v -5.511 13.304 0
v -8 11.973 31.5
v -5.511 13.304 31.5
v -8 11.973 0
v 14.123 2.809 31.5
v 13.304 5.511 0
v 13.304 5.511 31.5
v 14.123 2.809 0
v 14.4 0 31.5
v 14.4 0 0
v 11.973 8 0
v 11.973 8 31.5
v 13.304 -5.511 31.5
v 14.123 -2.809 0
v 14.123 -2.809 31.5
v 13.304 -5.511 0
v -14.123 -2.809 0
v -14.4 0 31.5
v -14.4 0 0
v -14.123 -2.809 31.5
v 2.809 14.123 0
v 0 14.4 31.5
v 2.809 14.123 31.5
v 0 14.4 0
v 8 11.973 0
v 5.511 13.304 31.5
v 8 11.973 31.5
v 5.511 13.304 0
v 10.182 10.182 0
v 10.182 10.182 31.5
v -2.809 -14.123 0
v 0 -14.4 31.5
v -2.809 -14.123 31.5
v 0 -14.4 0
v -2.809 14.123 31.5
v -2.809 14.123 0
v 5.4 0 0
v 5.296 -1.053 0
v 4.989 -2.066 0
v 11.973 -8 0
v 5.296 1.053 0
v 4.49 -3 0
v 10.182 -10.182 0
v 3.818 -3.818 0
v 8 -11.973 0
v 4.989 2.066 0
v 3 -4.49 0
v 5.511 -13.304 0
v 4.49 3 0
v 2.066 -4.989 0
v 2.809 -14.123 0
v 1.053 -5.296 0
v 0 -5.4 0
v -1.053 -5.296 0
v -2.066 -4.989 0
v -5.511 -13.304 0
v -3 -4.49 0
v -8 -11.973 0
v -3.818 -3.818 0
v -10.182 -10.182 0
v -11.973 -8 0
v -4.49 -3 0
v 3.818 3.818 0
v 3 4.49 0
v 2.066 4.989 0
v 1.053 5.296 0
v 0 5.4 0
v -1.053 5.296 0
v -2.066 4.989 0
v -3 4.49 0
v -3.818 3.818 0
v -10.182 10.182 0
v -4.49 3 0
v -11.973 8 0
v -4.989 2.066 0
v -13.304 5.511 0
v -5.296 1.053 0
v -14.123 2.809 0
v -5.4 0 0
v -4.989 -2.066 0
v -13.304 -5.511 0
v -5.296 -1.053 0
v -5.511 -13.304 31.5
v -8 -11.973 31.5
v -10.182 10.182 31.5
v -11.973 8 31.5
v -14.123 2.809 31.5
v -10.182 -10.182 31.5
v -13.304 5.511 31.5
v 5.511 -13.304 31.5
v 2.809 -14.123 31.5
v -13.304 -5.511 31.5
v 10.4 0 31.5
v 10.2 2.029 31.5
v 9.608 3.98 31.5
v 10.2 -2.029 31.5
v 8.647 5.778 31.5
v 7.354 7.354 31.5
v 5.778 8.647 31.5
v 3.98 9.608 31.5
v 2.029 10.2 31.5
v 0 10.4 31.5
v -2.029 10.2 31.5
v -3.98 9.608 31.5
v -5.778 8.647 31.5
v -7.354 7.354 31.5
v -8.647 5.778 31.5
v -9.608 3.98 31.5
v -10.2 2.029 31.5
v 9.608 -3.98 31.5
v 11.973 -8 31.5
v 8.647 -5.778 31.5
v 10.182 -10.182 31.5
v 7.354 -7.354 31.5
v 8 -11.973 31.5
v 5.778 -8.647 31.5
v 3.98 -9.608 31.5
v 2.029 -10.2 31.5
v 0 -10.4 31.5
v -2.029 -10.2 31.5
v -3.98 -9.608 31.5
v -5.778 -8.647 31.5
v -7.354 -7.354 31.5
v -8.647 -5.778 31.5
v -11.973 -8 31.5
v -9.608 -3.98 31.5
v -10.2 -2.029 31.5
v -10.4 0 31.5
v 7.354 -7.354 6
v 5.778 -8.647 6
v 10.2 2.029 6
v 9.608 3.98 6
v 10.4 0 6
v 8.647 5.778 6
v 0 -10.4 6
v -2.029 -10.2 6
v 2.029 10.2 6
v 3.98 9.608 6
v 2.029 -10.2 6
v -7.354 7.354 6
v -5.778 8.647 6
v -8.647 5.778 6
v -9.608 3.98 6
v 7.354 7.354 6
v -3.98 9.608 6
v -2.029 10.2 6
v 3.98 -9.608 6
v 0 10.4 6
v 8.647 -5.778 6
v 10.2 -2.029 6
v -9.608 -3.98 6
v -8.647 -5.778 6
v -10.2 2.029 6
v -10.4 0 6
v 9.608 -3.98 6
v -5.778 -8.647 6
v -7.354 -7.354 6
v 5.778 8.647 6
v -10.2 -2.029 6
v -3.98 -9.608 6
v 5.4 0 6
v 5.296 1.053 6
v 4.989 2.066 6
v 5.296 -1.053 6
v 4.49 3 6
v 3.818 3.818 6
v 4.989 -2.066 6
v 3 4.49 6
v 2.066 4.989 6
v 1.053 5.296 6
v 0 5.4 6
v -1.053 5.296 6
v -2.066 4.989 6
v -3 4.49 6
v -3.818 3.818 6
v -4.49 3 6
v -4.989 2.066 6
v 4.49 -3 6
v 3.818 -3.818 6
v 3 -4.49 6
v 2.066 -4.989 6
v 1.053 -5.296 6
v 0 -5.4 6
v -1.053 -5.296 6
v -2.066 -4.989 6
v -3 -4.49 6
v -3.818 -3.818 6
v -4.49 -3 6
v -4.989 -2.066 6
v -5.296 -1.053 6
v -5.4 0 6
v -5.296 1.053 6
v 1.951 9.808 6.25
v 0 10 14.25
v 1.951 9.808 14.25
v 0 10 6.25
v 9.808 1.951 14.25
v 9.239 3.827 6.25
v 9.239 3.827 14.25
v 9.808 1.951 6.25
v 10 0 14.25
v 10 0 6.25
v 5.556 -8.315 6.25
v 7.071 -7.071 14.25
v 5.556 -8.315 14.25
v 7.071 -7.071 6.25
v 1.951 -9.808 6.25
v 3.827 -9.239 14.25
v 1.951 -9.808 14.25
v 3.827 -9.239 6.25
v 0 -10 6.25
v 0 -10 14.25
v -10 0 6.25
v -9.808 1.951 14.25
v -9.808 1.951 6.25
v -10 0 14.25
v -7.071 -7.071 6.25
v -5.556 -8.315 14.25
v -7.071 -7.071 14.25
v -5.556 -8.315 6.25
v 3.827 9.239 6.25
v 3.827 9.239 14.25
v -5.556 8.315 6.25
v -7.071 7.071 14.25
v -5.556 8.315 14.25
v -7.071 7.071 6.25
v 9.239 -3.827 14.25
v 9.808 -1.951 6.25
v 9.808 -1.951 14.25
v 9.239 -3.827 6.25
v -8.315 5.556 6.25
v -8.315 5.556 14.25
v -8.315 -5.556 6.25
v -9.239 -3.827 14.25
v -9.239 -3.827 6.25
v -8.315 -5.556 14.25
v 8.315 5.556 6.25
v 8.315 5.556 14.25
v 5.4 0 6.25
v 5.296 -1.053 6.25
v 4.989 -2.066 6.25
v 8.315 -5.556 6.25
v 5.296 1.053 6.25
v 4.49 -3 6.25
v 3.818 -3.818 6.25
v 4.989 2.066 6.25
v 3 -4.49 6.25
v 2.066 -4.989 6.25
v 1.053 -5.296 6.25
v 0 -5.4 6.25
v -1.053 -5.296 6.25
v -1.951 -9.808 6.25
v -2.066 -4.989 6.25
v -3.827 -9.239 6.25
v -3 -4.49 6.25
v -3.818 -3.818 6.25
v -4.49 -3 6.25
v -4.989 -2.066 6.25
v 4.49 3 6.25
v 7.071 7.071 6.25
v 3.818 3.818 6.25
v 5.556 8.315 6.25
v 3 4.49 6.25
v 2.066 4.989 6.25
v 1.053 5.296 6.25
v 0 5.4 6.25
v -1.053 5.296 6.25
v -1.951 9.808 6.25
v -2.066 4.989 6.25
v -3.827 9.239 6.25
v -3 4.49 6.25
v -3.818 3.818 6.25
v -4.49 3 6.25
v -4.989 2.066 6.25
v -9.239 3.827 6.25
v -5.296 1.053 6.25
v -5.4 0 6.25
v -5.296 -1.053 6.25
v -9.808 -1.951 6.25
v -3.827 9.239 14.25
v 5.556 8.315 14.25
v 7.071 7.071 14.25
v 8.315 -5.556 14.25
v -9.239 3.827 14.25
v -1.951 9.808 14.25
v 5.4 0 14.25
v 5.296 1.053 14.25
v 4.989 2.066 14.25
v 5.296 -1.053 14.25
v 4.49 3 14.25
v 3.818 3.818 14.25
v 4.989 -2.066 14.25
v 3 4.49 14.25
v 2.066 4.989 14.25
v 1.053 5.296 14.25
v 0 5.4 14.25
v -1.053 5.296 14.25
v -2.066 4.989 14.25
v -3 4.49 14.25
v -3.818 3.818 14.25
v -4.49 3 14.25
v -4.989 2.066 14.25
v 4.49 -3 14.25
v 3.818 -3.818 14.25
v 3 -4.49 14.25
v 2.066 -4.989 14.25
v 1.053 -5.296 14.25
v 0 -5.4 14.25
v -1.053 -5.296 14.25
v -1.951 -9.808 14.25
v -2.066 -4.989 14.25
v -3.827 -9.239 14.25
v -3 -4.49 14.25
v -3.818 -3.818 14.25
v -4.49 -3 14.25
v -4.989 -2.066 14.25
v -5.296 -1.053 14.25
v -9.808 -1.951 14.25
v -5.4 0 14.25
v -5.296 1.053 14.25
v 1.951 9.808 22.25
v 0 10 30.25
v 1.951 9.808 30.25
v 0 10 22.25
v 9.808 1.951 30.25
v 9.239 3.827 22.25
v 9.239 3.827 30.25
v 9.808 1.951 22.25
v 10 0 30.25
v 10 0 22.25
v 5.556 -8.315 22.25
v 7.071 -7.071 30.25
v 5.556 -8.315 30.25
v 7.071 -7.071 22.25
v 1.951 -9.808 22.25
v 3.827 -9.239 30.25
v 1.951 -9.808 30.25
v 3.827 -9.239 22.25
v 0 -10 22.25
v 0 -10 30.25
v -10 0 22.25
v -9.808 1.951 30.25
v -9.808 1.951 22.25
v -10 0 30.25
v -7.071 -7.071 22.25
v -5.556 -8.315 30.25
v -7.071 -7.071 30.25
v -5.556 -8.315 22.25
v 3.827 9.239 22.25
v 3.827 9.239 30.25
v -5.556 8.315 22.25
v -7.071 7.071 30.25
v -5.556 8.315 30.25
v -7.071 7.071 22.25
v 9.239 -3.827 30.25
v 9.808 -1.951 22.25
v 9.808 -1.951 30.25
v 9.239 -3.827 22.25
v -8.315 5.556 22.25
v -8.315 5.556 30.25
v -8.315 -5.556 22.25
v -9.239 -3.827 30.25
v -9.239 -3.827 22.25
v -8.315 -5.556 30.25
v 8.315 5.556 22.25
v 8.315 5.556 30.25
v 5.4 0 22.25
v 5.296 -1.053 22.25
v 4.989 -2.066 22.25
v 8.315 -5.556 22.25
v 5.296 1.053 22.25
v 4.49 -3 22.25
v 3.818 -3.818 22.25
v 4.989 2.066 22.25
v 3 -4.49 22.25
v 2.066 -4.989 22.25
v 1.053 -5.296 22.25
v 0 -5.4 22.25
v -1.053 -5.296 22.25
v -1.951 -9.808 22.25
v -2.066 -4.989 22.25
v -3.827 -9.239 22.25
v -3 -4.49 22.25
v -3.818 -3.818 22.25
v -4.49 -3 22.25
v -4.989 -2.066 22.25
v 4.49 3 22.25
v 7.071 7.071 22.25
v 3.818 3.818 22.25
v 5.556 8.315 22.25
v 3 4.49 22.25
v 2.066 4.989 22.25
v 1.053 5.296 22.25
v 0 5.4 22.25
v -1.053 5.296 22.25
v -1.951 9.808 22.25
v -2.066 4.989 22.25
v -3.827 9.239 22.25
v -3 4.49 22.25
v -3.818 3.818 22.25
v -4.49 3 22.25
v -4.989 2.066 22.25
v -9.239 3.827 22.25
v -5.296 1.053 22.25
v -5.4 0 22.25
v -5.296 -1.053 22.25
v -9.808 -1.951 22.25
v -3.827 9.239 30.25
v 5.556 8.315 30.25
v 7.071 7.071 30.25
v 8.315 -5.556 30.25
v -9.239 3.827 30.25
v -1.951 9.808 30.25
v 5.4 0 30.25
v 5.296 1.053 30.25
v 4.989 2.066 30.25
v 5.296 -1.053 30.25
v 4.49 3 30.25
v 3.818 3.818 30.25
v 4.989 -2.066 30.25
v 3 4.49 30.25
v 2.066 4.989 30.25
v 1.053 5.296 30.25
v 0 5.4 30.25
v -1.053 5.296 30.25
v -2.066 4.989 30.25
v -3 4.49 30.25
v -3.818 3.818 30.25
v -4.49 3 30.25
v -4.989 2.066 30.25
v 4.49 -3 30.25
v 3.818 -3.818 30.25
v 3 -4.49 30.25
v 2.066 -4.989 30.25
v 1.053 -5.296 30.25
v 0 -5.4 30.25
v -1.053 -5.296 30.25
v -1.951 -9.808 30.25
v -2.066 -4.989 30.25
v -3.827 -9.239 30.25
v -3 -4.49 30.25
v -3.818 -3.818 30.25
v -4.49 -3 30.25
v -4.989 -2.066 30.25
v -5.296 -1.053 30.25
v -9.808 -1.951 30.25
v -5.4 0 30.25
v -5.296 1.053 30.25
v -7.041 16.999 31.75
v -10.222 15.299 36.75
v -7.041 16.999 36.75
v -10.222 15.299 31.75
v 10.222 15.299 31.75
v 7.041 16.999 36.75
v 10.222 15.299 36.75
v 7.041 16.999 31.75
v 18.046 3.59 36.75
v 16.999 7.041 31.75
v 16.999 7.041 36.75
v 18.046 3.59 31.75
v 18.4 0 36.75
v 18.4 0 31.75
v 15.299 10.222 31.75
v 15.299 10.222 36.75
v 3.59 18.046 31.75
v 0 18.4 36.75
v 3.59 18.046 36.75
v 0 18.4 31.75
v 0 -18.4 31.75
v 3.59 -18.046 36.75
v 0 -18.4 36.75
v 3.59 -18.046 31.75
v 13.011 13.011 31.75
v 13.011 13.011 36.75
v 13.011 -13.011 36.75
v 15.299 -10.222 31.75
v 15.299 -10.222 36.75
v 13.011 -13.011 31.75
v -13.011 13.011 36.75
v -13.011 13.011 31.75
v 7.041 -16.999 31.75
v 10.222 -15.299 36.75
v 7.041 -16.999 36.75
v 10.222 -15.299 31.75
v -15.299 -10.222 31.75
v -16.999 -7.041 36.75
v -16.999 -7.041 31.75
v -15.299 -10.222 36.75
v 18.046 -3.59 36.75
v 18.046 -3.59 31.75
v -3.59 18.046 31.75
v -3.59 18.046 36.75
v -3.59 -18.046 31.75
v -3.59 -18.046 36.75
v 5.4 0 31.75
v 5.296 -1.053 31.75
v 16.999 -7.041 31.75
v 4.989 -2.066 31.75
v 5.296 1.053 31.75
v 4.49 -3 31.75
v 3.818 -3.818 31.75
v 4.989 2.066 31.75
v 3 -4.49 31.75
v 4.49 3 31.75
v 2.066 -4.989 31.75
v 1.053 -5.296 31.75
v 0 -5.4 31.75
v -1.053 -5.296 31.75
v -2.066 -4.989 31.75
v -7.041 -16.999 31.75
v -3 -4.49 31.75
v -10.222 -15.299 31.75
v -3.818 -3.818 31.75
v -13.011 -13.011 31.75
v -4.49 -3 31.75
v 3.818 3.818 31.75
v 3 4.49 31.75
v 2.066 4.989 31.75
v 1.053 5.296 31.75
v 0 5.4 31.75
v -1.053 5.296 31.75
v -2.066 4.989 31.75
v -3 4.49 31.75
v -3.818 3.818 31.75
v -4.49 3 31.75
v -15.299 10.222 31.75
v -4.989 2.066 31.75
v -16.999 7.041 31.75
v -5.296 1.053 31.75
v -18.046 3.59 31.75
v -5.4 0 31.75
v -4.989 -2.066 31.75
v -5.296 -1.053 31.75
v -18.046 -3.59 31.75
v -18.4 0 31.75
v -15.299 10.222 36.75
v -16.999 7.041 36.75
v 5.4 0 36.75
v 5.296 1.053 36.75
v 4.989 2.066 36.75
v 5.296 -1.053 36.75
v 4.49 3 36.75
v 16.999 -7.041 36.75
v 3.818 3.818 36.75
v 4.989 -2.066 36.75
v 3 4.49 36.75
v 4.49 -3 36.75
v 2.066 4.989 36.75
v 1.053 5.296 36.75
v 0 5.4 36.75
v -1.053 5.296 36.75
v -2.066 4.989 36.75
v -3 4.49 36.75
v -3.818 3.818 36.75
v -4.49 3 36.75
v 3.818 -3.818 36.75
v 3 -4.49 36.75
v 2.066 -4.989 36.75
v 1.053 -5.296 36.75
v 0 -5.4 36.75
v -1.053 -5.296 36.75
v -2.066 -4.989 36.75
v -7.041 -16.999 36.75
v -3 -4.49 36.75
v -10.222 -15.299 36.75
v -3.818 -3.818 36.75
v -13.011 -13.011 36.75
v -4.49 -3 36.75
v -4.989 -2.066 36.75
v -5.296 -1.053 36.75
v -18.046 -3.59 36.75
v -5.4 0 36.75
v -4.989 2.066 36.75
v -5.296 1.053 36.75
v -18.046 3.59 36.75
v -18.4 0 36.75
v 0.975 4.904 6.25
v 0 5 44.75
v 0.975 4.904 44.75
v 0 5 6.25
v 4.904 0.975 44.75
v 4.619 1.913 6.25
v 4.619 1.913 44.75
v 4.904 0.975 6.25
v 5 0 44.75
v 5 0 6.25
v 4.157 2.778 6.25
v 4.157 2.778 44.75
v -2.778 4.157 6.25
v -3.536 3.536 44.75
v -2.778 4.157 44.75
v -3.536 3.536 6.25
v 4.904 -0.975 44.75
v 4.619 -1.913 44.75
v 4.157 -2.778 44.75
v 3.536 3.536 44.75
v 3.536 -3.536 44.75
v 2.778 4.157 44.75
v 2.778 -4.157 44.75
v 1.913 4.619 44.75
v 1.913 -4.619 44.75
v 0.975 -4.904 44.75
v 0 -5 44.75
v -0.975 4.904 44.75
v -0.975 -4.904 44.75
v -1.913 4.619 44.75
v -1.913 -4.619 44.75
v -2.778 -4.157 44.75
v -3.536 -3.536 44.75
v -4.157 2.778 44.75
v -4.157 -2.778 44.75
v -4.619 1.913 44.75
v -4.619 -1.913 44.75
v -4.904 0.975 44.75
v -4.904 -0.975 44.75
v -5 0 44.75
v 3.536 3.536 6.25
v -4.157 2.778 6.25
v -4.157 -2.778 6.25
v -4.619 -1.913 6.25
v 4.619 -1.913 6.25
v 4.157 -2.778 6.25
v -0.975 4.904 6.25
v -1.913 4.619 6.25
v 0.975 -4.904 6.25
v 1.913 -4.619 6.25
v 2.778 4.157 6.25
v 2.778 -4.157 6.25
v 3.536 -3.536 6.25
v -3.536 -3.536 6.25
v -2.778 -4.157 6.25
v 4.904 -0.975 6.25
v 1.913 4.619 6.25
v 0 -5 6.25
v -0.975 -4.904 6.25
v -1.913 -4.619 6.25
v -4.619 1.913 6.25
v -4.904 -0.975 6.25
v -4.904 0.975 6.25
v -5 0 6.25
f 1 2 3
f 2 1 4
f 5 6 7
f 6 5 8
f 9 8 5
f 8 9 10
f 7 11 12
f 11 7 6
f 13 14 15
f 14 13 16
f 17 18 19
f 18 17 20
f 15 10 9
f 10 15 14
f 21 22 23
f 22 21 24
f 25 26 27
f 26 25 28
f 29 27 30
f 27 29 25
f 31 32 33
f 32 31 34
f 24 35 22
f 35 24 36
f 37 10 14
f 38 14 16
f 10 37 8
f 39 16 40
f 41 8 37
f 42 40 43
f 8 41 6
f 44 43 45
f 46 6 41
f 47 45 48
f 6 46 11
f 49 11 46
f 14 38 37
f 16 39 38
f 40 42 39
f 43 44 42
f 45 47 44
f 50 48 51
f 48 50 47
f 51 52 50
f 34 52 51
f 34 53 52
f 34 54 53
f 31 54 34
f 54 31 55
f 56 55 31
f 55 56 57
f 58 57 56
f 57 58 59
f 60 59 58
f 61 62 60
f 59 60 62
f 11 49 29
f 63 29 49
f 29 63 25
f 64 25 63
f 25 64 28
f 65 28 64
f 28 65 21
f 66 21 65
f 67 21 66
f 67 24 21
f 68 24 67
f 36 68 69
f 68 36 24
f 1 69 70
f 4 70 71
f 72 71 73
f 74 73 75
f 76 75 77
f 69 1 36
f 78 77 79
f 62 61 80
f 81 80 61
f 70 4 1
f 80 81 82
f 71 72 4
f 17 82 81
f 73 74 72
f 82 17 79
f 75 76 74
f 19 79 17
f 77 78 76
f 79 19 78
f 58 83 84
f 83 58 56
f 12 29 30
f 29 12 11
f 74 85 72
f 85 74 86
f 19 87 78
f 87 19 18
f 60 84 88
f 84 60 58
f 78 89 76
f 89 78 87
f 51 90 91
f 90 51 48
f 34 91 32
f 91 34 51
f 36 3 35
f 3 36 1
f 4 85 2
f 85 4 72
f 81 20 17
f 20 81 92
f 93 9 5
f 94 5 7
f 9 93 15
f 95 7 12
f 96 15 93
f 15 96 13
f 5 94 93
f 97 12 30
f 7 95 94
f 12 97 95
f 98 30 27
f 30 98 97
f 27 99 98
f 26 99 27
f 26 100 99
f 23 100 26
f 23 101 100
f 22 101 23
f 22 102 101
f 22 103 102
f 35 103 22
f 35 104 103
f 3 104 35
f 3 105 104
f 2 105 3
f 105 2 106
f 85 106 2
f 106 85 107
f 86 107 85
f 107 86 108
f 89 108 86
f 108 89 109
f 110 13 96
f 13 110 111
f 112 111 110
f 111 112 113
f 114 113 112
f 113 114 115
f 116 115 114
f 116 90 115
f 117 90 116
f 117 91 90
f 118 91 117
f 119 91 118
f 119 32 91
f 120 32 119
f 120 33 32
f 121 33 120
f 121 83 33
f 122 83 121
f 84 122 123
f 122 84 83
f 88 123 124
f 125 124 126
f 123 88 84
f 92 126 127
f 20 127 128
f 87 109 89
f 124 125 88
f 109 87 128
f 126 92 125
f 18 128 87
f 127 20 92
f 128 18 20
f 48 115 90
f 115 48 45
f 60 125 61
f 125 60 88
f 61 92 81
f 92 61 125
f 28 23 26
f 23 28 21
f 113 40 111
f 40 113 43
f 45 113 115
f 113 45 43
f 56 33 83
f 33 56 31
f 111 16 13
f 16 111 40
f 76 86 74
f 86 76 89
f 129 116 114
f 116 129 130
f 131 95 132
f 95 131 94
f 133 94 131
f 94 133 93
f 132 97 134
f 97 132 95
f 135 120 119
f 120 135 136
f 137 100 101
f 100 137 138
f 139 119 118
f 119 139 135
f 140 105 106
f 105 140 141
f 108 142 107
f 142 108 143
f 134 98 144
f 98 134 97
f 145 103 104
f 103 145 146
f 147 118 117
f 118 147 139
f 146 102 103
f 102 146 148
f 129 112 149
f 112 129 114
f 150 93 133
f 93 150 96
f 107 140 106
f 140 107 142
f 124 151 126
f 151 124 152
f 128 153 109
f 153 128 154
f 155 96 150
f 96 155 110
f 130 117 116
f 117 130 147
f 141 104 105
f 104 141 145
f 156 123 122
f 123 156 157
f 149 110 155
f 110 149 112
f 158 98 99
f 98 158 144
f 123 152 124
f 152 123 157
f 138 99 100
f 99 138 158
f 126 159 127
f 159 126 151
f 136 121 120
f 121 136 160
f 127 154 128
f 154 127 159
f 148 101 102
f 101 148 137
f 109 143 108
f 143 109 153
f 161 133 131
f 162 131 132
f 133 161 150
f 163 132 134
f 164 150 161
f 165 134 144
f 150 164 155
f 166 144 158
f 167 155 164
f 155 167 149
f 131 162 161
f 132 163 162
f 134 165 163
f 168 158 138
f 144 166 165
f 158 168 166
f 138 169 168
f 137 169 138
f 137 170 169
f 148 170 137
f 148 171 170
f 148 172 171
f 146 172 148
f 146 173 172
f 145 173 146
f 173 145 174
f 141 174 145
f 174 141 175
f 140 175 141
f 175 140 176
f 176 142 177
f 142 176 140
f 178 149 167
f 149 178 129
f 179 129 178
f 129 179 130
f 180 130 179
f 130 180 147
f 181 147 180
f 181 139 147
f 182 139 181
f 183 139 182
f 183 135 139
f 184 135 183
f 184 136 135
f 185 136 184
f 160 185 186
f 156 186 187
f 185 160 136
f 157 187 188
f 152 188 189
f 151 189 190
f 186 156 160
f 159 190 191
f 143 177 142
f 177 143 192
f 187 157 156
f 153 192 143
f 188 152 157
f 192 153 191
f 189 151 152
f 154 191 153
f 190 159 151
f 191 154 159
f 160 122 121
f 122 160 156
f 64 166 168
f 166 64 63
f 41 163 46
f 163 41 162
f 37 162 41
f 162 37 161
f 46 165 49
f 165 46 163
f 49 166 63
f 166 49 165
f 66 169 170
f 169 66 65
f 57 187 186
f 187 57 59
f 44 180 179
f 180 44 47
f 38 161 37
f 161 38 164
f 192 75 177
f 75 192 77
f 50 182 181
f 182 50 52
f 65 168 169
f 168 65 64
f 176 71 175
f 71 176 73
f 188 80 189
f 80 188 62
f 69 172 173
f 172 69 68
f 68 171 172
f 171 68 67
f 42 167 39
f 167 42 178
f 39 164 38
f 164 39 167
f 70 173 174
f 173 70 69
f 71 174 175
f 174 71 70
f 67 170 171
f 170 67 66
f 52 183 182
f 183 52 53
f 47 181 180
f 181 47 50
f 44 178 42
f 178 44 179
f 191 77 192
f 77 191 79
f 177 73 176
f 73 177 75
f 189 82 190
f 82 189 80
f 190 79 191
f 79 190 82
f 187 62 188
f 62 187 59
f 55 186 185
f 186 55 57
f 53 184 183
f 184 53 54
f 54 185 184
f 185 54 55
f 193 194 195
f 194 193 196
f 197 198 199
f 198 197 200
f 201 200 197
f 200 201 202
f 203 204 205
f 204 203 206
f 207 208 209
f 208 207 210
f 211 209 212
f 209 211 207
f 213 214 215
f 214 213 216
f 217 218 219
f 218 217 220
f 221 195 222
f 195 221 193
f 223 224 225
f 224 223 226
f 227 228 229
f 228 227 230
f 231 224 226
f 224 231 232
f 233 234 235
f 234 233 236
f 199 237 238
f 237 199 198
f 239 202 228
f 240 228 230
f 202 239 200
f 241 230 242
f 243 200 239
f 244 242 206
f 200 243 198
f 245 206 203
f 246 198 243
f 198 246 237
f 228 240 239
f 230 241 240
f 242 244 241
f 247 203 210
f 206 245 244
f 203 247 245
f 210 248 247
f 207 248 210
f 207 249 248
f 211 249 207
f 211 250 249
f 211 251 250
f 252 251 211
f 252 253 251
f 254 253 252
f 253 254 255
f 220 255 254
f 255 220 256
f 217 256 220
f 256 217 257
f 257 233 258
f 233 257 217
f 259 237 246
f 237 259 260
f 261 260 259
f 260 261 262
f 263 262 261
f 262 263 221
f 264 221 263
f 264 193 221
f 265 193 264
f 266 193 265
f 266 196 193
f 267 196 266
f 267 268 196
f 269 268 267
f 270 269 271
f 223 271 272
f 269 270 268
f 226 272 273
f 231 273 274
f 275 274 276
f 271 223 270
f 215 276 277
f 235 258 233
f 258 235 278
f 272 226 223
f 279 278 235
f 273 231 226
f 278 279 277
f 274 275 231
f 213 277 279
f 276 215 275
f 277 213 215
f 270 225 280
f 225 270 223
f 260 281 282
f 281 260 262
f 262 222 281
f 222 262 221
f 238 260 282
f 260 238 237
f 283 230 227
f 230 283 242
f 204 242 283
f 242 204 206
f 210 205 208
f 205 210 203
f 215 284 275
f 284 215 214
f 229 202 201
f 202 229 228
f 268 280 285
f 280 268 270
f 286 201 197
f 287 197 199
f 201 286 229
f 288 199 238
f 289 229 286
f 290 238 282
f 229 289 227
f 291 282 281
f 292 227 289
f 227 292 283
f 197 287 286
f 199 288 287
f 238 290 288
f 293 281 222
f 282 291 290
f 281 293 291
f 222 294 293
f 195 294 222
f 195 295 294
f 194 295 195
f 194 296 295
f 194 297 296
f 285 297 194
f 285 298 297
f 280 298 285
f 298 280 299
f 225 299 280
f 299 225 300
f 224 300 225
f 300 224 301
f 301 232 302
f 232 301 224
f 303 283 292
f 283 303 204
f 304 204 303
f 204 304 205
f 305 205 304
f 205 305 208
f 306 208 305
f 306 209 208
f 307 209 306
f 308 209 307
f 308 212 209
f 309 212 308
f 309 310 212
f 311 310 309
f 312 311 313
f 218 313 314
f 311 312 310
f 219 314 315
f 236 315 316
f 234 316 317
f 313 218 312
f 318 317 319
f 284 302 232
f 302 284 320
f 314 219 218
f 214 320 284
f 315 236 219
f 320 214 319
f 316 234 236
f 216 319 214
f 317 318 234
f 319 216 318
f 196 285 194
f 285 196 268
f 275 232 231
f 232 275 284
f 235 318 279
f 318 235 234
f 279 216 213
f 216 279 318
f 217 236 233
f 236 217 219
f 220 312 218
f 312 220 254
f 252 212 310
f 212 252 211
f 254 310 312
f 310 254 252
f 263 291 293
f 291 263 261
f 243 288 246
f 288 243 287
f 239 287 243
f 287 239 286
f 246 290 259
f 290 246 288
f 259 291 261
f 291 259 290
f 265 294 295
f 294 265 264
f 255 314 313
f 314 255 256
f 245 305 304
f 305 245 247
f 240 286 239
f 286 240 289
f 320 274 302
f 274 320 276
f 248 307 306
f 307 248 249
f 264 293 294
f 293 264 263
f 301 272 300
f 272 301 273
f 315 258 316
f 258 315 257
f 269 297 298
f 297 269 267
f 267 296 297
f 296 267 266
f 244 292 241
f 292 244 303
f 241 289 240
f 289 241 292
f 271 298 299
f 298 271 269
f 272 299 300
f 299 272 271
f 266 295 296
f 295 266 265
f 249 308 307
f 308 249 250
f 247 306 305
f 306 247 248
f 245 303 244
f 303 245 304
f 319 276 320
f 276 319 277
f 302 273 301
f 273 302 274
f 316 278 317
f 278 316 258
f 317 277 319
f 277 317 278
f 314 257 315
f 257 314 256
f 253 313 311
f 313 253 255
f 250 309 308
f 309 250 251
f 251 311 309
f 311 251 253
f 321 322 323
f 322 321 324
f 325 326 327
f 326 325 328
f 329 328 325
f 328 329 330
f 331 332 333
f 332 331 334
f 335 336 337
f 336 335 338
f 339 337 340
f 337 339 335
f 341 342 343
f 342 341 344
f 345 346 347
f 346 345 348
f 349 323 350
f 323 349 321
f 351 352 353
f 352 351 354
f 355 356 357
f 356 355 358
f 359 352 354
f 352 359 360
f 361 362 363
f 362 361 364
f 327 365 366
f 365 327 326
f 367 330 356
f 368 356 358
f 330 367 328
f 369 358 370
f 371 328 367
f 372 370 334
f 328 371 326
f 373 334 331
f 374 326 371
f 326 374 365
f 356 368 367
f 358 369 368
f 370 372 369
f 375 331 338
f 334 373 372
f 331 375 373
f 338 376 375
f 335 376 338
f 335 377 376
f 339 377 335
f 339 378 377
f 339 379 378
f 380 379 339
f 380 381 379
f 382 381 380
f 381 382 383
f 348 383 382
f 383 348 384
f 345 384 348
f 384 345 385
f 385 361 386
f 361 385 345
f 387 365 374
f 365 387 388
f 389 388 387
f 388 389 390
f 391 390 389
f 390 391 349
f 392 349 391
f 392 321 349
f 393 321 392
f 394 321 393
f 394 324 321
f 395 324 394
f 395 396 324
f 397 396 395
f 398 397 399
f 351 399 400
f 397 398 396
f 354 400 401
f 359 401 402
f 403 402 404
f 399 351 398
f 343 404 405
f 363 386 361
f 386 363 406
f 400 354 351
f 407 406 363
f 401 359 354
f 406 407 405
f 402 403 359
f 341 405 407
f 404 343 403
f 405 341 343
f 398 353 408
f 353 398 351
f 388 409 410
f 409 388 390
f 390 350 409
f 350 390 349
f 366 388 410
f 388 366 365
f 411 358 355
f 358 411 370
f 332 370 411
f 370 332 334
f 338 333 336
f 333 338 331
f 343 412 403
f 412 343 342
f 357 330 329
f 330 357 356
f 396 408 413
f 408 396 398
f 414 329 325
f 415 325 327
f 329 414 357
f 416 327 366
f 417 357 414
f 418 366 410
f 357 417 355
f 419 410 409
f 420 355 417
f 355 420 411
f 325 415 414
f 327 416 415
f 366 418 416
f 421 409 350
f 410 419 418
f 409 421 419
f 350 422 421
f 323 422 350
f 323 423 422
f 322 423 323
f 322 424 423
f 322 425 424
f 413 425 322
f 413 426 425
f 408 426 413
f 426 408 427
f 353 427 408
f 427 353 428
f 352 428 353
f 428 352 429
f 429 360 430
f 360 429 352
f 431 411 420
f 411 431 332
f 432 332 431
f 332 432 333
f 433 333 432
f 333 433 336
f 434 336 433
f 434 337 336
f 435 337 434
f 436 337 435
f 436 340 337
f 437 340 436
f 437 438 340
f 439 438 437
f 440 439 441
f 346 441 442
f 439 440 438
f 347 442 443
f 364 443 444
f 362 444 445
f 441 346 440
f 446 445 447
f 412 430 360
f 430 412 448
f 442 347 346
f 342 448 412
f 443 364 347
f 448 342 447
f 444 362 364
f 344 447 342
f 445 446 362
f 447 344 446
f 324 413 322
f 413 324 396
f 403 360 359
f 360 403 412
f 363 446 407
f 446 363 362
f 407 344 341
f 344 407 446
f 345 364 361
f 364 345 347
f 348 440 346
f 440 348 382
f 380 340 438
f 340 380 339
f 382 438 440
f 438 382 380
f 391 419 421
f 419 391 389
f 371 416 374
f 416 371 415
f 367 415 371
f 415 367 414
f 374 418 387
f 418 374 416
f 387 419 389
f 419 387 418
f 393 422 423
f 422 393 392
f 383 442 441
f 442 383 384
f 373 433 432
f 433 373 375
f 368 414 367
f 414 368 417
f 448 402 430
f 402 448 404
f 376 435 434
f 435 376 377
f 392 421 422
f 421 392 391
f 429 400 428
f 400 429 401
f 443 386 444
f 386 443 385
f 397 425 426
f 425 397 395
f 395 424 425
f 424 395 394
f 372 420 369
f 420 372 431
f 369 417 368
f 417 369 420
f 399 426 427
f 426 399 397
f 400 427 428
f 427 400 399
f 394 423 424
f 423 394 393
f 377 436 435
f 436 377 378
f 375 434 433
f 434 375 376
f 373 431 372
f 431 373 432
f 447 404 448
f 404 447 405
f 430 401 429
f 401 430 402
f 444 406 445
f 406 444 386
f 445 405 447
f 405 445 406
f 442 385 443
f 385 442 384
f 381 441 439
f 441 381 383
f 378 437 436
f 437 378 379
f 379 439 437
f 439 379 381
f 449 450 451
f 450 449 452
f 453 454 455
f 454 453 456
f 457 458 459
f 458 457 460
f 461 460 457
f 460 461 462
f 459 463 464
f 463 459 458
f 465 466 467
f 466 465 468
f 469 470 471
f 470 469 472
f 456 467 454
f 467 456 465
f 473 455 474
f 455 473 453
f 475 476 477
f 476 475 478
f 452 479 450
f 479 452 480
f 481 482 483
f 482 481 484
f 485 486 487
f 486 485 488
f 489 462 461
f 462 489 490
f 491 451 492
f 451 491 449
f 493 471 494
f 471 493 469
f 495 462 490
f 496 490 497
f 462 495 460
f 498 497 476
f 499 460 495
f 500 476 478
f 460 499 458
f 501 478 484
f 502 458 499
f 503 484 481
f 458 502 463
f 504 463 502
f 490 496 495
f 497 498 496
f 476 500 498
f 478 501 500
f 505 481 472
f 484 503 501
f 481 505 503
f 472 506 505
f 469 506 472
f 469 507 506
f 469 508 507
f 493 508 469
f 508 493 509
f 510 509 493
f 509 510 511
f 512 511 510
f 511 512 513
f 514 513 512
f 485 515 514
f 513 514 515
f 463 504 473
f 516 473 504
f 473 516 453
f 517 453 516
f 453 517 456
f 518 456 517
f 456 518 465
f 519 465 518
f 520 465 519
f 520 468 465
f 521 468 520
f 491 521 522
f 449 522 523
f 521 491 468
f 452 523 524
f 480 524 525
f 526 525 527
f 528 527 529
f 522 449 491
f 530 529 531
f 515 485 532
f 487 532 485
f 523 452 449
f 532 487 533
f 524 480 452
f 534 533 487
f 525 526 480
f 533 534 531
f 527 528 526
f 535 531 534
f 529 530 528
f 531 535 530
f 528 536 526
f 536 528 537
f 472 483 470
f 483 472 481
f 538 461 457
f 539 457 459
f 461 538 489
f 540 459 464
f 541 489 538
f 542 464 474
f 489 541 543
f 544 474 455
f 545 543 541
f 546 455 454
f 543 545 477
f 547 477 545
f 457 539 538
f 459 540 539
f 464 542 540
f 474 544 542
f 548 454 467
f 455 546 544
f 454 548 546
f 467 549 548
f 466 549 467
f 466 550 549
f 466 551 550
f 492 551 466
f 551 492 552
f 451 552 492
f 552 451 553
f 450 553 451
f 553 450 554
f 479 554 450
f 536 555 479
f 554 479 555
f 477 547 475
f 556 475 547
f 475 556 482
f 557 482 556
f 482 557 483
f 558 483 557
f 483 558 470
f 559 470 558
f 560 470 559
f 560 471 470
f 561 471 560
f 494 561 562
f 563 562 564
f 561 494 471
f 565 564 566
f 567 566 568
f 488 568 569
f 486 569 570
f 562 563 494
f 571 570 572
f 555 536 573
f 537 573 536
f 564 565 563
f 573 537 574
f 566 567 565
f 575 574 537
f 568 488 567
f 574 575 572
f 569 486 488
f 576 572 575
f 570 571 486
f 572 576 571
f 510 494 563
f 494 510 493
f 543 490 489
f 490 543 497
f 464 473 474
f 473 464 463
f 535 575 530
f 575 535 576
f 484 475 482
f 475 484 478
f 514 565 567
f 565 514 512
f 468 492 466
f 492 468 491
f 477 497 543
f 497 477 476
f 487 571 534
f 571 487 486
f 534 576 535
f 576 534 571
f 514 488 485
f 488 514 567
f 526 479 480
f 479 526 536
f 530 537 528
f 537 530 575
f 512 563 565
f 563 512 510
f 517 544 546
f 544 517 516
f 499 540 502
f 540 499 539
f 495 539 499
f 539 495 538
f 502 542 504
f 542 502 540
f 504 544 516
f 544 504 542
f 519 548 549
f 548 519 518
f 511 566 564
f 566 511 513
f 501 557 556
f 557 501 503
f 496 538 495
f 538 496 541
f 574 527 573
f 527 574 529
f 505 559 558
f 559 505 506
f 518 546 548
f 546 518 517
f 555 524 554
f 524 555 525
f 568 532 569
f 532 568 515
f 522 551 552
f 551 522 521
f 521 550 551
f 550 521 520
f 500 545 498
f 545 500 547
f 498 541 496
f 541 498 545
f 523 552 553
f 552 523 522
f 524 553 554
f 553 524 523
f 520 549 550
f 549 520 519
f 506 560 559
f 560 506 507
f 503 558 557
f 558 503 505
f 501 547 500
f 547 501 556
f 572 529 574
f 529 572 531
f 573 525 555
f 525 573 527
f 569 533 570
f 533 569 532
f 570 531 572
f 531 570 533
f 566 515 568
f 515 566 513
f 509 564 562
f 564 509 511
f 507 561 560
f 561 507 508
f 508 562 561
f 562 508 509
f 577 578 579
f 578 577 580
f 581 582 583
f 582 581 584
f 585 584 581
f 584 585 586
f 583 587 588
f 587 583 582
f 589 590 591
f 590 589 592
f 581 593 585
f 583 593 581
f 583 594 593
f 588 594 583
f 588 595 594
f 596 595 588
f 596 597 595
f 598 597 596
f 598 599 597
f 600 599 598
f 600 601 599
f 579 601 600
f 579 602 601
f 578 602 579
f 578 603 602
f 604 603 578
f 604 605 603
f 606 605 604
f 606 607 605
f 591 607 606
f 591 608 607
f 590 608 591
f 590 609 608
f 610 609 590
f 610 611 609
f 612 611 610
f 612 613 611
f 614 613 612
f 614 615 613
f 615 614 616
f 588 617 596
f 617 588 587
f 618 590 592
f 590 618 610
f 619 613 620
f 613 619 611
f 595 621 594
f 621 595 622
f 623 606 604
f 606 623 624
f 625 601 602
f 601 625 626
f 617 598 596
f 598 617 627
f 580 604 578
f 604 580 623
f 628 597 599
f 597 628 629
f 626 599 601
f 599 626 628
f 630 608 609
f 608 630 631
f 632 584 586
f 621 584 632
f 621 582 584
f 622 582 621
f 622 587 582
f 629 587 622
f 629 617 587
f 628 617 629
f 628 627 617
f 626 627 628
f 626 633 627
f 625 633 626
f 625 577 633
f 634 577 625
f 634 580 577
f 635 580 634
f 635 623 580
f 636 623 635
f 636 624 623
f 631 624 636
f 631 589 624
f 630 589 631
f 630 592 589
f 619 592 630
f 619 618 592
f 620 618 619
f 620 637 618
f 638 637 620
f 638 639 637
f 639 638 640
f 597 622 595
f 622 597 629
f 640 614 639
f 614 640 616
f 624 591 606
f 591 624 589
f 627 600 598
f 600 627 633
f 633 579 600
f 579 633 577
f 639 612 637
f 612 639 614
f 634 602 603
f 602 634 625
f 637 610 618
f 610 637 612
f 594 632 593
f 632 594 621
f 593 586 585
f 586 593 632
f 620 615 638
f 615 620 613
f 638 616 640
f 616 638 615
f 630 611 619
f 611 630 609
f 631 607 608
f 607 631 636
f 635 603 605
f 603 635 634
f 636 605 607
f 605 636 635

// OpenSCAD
$fn = 32;

// ------------------------------------------------------------------------
// Shaft station: cup d28.8 x 31.5 mm, shaft d10
// Every part is its own module, assembly() places every instance.
// ------------------------------------------------------------------------

// --- part 1 ---
module housing_cup() {
  difference() {
    cylinder(h = 31.5, d = 28.8);
    translate([0, 0, 6]) cylinder(h = 26.5, d = 20.8);
    translate([0, 0, -1]) cylinder(h = 8, d = 10.8);
  }
}

// --- part 2 ---
module bearing_lower() {
  difference() {
      translate([0, 0, 0]) cylinder(h = 8, d = 20);
      translate([0, 0, -1]) cylinder(h = 10, d = 10.8);
    }
}

// --- part 3 ---
module bearing_upper() {
  difference() {
      translate([0, 0, 0]) cylinder(h = 8, d = 20);
      translate([0, 0, -1]) cylinder(h = 10, d = 10.8);
    }
}

// --- part 4 ---
module station_shaft() {
  translate([0, 0, -19.25]) cylinder(h = 38.5, d = 10);
}

// --- part 5 ---
module station_cover() {
  difference() {
    cylinder(h = 5, d = 36.8);
    translate([0, 0, -1]) cylinder(h = 7, d = 10.8);
  }
}

// --- assembly ---
module assembly() {
  color([0.80, 0.24, 0.20]) translate([0, 0, 0]) rotate([0, 0, 0]) housing_cup();
  color([0.20, 0.45, 0.75]) translate([0, 0, 6.25]) rotate([0, 0, 0]) bearing_lower();
  color([0.25, 0.62, 0.32]) translate([0, 0, 22.25]) rotate([0, 0, 0]) bearing_upper();
  color([0.92, 0.70, 0.18]) translate([0, 0, 25.5]) rotate([0, 0, 0]) station_shaft();
  color([0.58, 0.35, 0.70]) translate([0, 0, 31.75]) rotate([0, 0, 0]) station_cover();
}

assembly();
